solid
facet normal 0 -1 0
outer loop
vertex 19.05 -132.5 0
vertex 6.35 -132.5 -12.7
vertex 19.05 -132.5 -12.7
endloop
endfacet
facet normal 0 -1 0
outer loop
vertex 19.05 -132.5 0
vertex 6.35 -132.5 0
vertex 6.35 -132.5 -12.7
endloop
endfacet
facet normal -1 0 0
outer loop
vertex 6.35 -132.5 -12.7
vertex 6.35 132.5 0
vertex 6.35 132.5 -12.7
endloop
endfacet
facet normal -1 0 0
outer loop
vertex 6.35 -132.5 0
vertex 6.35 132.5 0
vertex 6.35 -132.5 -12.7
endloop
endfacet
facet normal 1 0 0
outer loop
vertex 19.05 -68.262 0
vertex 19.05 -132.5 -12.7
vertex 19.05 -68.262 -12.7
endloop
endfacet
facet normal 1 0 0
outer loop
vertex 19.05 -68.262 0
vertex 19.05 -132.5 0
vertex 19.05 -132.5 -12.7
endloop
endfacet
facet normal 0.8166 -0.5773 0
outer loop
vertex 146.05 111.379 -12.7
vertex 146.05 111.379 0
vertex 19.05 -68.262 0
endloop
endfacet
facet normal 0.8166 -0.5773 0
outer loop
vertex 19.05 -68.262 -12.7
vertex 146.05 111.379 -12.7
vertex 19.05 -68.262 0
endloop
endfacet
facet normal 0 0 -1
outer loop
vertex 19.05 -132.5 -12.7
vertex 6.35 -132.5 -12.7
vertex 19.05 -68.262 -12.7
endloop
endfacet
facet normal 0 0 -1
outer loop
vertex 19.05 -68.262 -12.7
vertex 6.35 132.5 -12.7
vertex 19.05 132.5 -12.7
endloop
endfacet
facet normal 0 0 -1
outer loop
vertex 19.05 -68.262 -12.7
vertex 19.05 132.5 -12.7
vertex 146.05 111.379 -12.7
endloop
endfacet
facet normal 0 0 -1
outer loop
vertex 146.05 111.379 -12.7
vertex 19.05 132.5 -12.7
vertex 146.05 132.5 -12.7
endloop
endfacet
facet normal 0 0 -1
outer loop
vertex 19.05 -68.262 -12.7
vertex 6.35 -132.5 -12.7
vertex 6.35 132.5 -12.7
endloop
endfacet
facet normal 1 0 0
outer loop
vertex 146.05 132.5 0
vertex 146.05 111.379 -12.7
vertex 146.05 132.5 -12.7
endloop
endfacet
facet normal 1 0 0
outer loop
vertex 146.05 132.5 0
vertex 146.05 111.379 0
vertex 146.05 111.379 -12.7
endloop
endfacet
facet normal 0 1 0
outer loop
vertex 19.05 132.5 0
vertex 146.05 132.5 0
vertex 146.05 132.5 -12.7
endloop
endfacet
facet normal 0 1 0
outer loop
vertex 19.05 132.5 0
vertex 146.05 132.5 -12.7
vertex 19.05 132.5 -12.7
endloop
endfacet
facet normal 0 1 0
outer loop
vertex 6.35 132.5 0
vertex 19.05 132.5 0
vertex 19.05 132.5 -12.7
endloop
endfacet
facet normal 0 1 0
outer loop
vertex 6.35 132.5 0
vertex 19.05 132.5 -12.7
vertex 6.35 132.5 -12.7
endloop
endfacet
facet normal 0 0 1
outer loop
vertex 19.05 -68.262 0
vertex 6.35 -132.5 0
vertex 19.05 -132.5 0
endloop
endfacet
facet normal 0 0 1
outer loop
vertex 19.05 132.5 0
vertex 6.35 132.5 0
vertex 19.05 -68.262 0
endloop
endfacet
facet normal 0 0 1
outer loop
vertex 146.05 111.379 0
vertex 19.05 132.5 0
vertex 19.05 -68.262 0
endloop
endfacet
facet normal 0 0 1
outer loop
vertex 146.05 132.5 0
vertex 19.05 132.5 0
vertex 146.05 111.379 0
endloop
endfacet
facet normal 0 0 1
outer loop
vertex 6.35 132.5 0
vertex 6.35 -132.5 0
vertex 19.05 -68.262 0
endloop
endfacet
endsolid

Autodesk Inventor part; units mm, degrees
ref_plane "YZ Plane" through (0, 0, 0) normal (1, 0, 0) x (0, 1, 0)
ref_plane "XZ Plane" through (0, 0, 0) normal (0, 1, 0) x (-1, 0, 0)
ref_plane "XY Plane" through (0, 0, 0) normal (0, 0, 1) x (1, 0, 0)
sketch "Sketch1" plane through (0, 0, 0) normal (0, 0, 1) x (1, 0, 0)
  line L0 (6.35, -132.5) -> (19.05, -132.5)
  line L1 (19.05, 132.5) -> (6.35, 132.5)
  line L2 (6.35, 132.5) -> (6.35, -132.5)
  line L3 (146.05, 111.3788) -> (146.05, 132.5)
  line L4 (146.05, 132.5) -> (19.05, 132.5)
  line L5 (146.05, 111.3788) -> (19.05, -68.2625)
  line L6 (19.05, -132.5) -> (19.05, -68.2625)
  point P0 (0, 0)
extrude "Extrusion1" add sketch "Sketch1" against normal blind 12.7
properties part number "Side"
